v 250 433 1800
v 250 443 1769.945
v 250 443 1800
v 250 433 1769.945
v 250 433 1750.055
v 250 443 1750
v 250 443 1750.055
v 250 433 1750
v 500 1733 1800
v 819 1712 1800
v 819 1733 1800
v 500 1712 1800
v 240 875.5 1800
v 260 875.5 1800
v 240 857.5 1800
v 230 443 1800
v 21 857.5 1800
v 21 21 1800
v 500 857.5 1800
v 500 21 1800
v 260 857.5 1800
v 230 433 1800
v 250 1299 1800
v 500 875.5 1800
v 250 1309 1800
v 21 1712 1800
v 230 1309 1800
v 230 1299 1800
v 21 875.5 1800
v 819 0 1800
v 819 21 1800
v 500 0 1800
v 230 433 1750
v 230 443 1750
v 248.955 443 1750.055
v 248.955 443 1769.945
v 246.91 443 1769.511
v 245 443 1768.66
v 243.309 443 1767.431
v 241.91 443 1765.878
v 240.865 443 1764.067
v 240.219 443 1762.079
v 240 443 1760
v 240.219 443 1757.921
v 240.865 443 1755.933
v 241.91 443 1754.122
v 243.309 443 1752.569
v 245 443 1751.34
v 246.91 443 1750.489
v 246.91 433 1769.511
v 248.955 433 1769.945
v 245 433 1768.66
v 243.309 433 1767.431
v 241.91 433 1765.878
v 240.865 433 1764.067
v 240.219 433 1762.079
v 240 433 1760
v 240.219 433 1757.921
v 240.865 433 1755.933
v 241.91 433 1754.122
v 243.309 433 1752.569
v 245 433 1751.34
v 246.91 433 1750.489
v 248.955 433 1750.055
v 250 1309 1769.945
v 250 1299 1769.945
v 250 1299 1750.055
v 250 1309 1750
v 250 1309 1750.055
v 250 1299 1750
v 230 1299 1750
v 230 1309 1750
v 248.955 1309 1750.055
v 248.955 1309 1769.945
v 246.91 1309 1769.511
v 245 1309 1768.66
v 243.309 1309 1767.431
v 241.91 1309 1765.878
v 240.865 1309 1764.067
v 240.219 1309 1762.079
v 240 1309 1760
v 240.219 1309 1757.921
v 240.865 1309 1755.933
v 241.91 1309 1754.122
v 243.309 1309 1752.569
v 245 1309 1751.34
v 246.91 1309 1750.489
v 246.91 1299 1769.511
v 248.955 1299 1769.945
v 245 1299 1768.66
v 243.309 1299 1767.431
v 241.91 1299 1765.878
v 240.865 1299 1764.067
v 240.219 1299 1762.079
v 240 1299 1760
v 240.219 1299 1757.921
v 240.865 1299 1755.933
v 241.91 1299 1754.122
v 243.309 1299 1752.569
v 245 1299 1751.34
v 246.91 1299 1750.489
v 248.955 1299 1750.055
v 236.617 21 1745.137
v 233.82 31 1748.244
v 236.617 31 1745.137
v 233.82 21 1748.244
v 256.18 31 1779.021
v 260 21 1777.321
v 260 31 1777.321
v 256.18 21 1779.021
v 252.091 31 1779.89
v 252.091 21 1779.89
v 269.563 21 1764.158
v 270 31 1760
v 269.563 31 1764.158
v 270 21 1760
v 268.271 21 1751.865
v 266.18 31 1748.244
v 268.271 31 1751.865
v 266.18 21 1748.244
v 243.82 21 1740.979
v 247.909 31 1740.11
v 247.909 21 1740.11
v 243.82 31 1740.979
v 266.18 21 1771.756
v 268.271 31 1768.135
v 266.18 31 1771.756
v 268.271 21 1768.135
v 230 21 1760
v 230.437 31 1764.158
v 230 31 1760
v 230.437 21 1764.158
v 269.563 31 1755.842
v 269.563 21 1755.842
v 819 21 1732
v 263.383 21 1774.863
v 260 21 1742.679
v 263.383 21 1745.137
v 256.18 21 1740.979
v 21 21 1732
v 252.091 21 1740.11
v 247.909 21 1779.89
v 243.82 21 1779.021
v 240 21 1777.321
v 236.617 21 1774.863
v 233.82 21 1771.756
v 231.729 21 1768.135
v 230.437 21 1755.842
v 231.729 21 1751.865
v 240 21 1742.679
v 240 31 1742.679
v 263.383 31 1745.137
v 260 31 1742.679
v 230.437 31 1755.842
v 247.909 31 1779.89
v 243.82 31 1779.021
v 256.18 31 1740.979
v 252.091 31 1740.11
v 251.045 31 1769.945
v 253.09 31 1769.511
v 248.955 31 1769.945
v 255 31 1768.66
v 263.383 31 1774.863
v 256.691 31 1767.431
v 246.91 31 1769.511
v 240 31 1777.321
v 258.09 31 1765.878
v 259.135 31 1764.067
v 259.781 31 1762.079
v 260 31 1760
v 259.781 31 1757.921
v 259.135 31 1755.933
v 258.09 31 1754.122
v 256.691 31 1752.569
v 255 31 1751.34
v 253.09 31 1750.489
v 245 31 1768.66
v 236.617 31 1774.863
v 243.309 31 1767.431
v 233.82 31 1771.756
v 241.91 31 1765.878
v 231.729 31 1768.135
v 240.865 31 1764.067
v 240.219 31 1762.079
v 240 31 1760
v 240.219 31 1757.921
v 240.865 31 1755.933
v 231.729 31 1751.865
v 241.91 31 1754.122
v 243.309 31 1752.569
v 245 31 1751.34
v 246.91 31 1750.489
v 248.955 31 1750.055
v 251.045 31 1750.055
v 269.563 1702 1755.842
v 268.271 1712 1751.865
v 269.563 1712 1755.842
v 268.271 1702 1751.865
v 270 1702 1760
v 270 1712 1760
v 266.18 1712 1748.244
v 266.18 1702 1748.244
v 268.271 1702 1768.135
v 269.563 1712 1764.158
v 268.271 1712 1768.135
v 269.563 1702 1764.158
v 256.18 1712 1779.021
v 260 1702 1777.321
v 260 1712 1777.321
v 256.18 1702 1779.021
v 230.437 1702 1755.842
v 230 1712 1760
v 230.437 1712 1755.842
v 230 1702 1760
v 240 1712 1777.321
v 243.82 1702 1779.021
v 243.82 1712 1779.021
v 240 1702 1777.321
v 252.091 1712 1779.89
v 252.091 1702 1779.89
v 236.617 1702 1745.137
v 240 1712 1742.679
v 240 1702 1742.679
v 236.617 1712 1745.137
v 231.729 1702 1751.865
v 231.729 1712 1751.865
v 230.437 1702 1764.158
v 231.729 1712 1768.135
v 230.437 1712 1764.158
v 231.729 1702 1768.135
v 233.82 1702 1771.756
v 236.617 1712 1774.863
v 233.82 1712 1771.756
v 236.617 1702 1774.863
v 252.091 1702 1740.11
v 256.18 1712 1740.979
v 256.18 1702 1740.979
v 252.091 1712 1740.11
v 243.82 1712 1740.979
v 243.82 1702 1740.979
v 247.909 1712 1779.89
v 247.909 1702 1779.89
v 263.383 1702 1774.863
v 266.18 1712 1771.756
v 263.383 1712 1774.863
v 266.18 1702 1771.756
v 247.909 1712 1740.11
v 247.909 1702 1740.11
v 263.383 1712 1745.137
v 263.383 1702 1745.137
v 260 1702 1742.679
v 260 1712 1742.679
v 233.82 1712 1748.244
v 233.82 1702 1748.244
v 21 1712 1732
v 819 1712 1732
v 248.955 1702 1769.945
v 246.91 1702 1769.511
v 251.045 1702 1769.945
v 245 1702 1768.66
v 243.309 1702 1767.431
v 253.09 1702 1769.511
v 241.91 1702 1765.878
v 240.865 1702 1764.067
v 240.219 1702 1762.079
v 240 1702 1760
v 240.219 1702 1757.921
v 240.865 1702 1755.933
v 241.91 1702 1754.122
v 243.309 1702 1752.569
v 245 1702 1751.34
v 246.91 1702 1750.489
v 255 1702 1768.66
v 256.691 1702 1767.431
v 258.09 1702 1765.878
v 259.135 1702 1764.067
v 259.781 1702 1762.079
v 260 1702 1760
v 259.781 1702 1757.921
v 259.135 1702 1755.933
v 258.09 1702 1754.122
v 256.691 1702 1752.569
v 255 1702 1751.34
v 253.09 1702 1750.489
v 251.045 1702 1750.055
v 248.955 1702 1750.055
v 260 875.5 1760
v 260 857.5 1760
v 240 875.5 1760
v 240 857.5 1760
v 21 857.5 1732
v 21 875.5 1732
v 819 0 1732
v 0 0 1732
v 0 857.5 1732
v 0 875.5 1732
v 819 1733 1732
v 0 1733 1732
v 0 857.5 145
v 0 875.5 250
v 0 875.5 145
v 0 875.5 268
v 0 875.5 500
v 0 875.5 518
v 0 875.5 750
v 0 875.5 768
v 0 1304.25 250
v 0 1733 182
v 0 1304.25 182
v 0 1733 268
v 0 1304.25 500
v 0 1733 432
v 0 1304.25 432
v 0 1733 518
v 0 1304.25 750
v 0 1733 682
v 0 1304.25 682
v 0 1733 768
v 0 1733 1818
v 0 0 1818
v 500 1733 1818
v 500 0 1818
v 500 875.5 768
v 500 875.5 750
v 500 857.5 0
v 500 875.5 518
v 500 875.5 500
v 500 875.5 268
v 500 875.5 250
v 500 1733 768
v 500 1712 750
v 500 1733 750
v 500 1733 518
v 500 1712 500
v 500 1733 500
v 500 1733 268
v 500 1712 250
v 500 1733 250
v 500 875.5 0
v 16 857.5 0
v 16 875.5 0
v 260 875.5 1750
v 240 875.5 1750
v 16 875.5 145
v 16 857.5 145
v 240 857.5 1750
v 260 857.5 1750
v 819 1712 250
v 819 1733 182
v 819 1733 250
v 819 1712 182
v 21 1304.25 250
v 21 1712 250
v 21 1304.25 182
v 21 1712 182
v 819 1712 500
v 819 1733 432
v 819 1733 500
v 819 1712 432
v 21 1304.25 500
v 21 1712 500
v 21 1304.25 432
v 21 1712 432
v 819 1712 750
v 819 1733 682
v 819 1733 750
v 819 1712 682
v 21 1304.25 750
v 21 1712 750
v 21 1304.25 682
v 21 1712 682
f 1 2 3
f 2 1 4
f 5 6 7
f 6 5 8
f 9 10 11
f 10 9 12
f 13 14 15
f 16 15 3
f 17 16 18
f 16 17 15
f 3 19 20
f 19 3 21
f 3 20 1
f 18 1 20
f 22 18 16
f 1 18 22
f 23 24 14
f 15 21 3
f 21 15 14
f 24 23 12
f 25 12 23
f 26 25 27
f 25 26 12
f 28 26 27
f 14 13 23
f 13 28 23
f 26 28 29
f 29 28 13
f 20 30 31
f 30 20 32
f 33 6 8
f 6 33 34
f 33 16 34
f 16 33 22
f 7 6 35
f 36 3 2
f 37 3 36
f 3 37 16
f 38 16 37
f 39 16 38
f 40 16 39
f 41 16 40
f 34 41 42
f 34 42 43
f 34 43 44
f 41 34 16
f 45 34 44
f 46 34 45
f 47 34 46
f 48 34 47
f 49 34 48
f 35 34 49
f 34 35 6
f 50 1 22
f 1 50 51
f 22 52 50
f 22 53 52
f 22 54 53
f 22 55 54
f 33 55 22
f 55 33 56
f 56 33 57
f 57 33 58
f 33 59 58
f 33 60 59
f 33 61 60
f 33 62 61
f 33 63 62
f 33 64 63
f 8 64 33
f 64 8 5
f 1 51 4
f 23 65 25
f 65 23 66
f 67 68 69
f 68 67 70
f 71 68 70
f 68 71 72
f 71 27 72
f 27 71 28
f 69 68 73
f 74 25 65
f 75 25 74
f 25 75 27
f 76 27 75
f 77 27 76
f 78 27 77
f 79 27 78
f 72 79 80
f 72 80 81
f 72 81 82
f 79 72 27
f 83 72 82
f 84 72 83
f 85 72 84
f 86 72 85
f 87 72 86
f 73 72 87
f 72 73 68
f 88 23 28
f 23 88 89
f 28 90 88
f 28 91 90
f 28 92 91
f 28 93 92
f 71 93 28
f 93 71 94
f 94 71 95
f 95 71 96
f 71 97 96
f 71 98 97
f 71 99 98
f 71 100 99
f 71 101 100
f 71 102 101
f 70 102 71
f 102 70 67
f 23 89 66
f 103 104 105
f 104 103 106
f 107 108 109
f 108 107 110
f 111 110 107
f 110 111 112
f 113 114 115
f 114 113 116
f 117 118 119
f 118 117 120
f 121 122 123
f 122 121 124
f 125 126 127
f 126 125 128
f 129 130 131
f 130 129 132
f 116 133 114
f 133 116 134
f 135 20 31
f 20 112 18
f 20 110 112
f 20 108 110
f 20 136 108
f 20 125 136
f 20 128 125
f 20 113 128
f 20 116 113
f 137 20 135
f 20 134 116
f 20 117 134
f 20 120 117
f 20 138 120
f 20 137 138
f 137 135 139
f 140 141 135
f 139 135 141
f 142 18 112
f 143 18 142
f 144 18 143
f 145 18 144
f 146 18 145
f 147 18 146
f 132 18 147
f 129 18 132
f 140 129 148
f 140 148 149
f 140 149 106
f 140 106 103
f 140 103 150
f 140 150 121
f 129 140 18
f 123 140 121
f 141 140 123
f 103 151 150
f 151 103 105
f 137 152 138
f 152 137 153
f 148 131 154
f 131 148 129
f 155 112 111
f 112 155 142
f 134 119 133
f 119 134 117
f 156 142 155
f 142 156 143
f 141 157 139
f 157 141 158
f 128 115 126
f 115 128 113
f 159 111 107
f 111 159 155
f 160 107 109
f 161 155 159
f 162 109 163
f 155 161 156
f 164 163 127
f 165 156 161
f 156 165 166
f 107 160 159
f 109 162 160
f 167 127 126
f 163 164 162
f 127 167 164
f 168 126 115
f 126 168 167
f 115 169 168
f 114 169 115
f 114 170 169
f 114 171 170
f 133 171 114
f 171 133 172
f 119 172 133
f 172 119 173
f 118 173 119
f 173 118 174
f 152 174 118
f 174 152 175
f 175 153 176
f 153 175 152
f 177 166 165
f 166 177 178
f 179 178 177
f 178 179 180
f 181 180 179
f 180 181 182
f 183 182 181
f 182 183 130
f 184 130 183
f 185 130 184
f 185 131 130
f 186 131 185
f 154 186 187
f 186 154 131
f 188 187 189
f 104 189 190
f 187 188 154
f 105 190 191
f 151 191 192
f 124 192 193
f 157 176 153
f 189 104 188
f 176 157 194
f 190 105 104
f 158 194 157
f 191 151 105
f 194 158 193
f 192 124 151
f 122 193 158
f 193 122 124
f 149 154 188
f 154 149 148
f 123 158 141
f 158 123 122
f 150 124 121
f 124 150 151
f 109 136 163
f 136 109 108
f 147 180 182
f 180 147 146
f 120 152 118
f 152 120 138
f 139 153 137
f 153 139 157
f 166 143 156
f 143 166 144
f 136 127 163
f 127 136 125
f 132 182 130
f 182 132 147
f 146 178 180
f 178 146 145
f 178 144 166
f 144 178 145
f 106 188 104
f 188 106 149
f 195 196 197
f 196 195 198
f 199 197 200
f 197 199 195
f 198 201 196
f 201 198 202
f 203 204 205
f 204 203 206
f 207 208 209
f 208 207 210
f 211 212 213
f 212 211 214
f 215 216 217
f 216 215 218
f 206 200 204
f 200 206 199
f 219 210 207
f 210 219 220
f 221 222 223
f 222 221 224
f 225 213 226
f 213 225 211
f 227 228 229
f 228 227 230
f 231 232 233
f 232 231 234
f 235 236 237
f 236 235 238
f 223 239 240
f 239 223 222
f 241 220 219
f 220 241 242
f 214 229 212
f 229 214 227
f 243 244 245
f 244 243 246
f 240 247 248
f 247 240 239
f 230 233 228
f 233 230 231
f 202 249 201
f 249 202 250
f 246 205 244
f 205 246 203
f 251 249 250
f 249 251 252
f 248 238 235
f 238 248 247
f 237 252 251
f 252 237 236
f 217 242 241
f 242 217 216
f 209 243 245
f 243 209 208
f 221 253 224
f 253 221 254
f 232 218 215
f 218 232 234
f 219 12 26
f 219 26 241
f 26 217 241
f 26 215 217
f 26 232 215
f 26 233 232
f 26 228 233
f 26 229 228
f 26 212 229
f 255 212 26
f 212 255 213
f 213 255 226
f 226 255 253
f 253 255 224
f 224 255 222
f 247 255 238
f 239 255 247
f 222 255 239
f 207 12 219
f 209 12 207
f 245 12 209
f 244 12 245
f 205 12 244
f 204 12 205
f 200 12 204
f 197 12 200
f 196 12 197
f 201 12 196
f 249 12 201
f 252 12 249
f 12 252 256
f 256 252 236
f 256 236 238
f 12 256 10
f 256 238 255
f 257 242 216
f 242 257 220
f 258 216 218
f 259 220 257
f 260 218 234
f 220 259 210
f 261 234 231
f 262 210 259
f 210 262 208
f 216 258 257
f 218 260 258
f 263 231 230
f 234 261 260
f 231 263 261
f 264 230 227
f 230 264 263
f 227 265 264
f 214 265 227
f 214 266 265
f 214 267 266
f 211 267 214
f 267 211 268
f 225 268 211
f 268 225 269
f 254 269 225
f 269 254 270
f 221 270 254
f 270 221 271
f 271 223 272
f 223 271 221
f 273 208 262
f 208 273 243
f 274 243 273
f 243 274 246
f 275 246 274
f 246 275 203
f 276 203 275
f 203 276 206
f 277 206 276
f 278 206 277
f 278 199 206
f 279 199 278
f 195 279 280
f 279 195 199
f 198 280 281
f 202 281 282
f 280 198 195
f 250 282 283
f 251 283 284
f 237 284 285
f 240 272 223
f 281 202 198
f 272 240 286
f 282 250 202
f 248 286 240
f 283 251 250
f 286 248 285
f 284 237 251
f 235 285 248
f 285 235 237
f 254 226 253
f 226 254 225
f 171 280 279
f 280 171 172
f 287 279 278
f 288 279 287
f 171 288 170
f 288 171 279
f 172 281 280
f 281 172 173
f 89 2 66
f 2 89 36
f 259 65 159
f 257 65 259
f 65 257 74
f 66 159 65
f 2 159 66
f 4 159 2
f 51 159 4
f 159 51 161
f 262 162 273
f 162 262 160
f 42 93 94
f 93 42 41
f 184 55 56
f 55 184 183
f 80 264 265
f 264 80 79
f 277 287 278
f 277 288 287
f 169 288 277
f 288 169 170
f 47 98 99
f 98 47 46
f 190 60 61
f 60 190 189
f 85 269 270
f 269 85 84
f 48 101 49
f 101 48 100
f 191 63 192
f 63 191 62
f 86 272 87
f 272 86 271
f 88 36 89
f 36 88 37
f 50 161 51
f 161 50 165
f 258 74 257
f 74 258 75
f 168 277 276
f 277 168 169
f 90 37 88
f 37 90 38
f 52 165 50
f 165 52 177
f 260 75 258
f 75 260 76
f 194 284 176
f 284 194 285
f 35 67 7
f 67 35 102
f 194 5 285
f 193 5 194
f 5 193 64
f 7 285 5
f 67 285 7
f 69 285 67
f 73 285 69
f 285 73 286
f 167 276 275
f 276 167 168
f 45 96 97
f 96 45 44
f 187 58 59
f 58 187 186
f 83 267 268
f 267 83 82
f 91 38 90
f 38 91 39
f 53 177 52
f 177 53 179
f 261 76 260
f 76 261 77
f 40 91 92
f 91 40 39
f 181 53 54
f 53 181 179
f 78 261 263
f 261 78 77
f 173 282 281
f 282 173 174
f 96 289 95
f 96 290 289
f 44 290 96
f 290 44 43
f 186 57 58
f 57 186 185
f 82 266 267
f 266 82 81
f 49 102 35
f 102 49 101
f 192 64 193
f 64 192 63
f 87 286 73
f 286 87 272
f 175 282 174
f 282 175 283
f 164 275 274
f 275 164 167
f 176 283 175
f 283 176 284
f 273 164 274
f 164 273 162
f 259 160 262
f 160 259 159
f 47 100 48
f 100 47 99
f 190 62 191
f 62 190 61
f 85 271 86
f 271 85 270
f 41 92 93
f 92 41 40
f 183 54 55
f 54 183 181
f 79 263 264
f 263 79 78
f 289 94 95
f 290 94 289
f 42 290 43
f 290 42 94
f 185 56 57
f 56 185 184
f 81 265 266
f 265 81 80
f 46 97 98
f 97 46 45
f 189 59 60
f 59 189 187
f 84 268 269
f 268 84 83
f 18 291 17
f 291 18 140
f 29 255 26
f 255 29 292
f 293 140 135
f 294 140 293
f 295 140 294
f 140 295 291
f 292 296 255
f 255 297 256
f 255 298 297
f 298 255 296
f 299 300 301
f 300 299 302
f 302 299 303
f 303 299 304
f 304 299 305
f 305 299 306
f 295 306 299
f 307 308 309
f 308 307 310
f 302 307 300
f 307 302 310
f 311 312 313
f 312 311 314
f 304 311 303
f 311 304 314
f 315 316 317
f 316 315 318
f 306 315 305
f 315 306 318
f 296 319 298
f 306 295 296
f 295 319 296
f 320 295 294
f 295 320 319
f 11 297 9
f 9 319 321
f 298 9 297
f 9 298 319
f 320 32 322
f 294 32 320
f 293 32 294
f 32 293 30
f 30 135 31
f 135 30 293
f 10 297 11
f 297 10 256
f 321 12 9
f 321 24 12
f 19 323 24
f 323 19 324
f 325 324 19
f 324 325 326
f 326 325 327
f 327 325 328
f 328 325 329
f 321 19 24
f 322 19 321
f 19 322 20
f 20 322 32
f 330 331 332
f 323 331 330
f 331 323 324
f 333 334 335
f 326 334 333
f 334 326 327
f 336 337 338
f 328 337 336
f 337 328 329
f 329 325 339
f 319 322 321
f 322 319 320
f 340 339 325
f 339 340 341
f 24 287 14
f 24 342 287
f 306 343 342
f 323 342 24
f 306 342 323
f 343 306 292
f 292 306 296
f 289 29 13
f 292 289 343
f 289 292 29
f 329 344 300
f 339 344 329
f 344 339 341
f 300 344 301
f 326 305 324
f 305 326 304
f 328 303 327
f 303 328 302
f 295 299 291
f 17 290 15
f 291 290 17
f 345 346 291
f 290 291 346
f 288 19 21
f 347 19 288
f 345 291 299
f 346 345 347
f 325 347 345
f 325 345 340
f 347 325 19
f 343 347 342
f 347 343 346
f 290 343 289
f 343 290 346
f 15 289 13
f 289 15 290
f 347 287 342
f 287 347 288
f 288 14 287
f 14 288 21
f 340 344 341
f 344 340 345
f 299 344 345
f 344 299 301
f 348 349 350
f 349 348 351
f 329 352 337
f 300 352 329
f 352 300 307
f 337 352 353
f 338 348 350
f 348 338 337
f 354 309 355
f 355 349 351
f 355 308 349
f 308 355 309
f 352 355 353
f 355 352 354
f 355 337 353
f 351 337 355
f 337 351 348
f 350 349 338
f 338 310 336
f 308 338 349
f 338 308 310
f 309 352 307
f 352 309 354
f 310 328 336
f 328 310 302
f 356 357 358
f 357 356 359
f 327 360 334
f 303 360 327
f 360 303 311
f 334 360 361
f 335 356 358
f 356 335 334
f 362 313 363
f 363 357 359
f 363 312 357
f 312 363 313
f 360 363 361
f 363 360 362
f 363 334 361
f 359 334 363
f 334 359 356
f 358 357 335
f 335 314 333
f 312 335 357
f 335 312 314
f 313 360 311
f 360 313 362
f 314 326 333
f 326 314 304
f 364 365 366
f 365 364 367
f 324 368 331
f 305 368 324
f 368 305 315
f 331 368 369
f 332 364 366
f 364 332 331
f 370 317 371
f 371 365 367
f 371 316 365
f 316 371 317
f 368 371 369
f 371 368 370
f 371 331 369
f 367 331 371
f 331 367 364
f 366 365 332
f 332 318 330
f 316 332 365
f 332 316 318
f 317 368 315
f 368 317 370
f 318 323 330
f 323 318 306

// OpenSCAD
// file: lib/wardrobe.scad
// Bedroom Wardrobe CAD
// Tips/lessons:
// - Build modules relative to 0,0,0, then translate into place later.
// - Dimensions are measured length (across), width (away), height (up).
// - This matches to y, x, z here.
// - Dimensions are also relative, so no necessarily x, y, z.
// - Use functions to represent dimensions

// Wardrobe dimensions
function wd_length() = 1733; // Y
function wd_width() = 0819; // X
function wd_height() = 2398; // Z

// Skirting dimensions
function wd_skirting_width() = 16;
function wd_skirting_height() = 145;

// Shelf dimensions
// Cut length to size.
function wd_shelf_height() = 18;
function wd_shelf_width() = 500;

// Batten dimensions
// Battens hold up shelves, cut height to size, and translate into place
// Notes: length and width of batton doesn't map directly to xyz
function wd_batten_large_length() = 68;
function wd_batten_large_width() = 21;

// Clothes rail dimensions
function wd_rail_radius() = 10;
function wd_rail_z() = -40;

module wd_wall_with_door() {
	door_length = 1381;
	door_height = 2000;
	border_length = (wd_length() - door_length) / 2;
	difference() {
		// border
		square([wd_height(), wd_length()]);
		// opening
		translate([0, border_length, 0])
			square([door_height, door_length]);
	}
}

module wd_skirting_rear() {
	cube([wd_skirting_width(), wd_length(), wd_skirting_height()]);
}

module wd_skirting_side() {
	cube([wd_width(), wd_skirting_width(), wd_skirting_height()]);
}

// Walls, guidance only 2D shapes
module wd_walls() {
	// base
	square([wd_width(), wd_length()]);
	// rear
	rotate(-90, [0, 1, 0])
		square([wd_height(), wd_length()]);
	// door
	translate([wd_width(), 0, 0])
		rotate(-90, [0, 1, 0])
		wd_wall_with_door();

	wd_skirting_rear();
	wd_skirting_side();
	translate([0, wd_length()-wd_skirting_width(), 0])
		wd_skirting_side();
}

module _crail_support(shelf_width, y) {
	h = 50;
	w = 20;
	l = 10;
	translate([shelf_width / 2 - w, y, 0 - h])
		cube([w, l, h]);
}

// Clothes rail full length, underneath shelf_height, centred on shelf_width.
module wd_crail_full(shelf_width) {
	// rail ends screw into the battens
	rail_end_radius = 20;
	rail_end_height = 10;
	rail_end_y = [wd_batten_large_width(),
		wd_length()-wd_batten_large_width()-rail_end_height];

	// rail supports suspend from the shelf
	rail_supports_y = [433, 1299];

	// Height of the pole if it were standing up
	rail_height = wd_length() - wd_batten_large_width() * 2;

	// Positioned half way under shelf_width and suspended z mm
	rail_x = shelf_width / 2;

	// rail
	translate([rail_x, wd_batten_large_width(), wd_rail_z()])
		rotate(-90, [1, 0, 0])
		cylinder(rail_height, wd_rail_radius(), wd_rail_radius());
	
	// supports
	for (i = rail_supports_y) {
		_crail_support(shelf_width, i);
	}
	for (i = rail_end_y) {
		translate([rail_x, i, wd_rail_z()])
			rotate(-90, [1, 0, 0])
			cylinder(rail_end_height, rail_end_radius,
				rail_end_radius);
	}
}

// Batten on the rear wall
module wd_batten_rear_large(length=wd_length()) {
	translate([0, 0, 0-wd_batten_large_length()])
	    cube([wd_batten_large_width(), length, wd_batten_large_length()]);
}

module wd_batten_side_large() {
	batten_rear_width = wd_batten_large_width();
	length = wd_batten_large_width();
	width = wd_width() - wd_batten_large_width();
	height = wd_batten_large_length();
	translate([batten_rear_width, 0, 0-wd_batten_large_length()])
		cube([width, length, height]);
}

// Create a full sized shelf
module wd_shelf_full(rail=false) {
	// Battens
	wd_batten_rear_large();
	wd_batten_side_large();
	translate([0, wd_length()-wd_batten_large_width(), 0])
		wd_batten_side_large();

	// Shelf
	cube([wd_shelf_width(), wd_length(), wd_shelf_height()]);

	if (rail) {
		wd_crail_full(wd_shelf_width());
	}
}

// Wardrobe divider wall
// Set cutout to true to cut out rail, batten, skirting holes
module wd_div_wall(height, cutout=false) {
	if (cutout) {
		difference() {
			cube([wd_shelf_width(), wd_shelf_height(), height]);
			// Cutout for rail
			// Note: When you build this, drill a nice hole
			c_rail_x = wd_shelf_width() / 2 - wd_rail_radius();
			c_rail_height = abs(wd_rail_z()) + wd_rail_radius();
			translate([c_rail_x, 0, height])
				mirror([0, 0, 1])
				cube([wd_rail_radius() * 2,
					wd_shelf_height(),
					c_rail_height]);
			// batten
			translate([0, 0, height])
				mirror([0, 0, 1])
				cube([wd_batten_large_width(),
					wd_shelf_height(),
					wd_batten_large_length()]);
			// skirting
			cube([wd_skirting_width(),
				wd_shelf_height(),
				wd_skirting_height()]);
		}
	} else {
		cube([wd_shelf_width(), wd_shelf_height(), height]);
	}
}

function wd_shelf_left_length_default() = 
	wd_length() / 2 - wd_shelf_height() / 2;

module wd_shelf_left(length=wd_shelf_left_length_default()) {
	wd_batten_side_large();
	wd_batten_rear_large(length / 2);
	cube([wd_shelf_width(), length, wd_shelf_height()]);
}

module wd_shelf_right(length=wd_shelf_left_length_default()) {
	translate([0, wd_length(), 0])
	mirror([0, 1, 0])
		wd_shelf_left(length);
}
// main file
// Half full-height, half half-height.
use <lib/wardrobe.scad>

function shelf_top_z() = 1800;
function div_wall_y() = wd_length() / 2 - wd_shelf_height() / 2;

% wd_walls();
translate([0, 0, shelf_top_z()])
	wd_shelf_full(rail=true);

translate([0, div_wall_y(), 0])
	wd_div_wall(shelf_top_z(), cutout=true);

// Leave 1100mm (min 1000mm) to hang Tom's clothes
for (i = [250, 500, 750]) {
	translate([0, 0, i])
		wd_shelf_right();
}
